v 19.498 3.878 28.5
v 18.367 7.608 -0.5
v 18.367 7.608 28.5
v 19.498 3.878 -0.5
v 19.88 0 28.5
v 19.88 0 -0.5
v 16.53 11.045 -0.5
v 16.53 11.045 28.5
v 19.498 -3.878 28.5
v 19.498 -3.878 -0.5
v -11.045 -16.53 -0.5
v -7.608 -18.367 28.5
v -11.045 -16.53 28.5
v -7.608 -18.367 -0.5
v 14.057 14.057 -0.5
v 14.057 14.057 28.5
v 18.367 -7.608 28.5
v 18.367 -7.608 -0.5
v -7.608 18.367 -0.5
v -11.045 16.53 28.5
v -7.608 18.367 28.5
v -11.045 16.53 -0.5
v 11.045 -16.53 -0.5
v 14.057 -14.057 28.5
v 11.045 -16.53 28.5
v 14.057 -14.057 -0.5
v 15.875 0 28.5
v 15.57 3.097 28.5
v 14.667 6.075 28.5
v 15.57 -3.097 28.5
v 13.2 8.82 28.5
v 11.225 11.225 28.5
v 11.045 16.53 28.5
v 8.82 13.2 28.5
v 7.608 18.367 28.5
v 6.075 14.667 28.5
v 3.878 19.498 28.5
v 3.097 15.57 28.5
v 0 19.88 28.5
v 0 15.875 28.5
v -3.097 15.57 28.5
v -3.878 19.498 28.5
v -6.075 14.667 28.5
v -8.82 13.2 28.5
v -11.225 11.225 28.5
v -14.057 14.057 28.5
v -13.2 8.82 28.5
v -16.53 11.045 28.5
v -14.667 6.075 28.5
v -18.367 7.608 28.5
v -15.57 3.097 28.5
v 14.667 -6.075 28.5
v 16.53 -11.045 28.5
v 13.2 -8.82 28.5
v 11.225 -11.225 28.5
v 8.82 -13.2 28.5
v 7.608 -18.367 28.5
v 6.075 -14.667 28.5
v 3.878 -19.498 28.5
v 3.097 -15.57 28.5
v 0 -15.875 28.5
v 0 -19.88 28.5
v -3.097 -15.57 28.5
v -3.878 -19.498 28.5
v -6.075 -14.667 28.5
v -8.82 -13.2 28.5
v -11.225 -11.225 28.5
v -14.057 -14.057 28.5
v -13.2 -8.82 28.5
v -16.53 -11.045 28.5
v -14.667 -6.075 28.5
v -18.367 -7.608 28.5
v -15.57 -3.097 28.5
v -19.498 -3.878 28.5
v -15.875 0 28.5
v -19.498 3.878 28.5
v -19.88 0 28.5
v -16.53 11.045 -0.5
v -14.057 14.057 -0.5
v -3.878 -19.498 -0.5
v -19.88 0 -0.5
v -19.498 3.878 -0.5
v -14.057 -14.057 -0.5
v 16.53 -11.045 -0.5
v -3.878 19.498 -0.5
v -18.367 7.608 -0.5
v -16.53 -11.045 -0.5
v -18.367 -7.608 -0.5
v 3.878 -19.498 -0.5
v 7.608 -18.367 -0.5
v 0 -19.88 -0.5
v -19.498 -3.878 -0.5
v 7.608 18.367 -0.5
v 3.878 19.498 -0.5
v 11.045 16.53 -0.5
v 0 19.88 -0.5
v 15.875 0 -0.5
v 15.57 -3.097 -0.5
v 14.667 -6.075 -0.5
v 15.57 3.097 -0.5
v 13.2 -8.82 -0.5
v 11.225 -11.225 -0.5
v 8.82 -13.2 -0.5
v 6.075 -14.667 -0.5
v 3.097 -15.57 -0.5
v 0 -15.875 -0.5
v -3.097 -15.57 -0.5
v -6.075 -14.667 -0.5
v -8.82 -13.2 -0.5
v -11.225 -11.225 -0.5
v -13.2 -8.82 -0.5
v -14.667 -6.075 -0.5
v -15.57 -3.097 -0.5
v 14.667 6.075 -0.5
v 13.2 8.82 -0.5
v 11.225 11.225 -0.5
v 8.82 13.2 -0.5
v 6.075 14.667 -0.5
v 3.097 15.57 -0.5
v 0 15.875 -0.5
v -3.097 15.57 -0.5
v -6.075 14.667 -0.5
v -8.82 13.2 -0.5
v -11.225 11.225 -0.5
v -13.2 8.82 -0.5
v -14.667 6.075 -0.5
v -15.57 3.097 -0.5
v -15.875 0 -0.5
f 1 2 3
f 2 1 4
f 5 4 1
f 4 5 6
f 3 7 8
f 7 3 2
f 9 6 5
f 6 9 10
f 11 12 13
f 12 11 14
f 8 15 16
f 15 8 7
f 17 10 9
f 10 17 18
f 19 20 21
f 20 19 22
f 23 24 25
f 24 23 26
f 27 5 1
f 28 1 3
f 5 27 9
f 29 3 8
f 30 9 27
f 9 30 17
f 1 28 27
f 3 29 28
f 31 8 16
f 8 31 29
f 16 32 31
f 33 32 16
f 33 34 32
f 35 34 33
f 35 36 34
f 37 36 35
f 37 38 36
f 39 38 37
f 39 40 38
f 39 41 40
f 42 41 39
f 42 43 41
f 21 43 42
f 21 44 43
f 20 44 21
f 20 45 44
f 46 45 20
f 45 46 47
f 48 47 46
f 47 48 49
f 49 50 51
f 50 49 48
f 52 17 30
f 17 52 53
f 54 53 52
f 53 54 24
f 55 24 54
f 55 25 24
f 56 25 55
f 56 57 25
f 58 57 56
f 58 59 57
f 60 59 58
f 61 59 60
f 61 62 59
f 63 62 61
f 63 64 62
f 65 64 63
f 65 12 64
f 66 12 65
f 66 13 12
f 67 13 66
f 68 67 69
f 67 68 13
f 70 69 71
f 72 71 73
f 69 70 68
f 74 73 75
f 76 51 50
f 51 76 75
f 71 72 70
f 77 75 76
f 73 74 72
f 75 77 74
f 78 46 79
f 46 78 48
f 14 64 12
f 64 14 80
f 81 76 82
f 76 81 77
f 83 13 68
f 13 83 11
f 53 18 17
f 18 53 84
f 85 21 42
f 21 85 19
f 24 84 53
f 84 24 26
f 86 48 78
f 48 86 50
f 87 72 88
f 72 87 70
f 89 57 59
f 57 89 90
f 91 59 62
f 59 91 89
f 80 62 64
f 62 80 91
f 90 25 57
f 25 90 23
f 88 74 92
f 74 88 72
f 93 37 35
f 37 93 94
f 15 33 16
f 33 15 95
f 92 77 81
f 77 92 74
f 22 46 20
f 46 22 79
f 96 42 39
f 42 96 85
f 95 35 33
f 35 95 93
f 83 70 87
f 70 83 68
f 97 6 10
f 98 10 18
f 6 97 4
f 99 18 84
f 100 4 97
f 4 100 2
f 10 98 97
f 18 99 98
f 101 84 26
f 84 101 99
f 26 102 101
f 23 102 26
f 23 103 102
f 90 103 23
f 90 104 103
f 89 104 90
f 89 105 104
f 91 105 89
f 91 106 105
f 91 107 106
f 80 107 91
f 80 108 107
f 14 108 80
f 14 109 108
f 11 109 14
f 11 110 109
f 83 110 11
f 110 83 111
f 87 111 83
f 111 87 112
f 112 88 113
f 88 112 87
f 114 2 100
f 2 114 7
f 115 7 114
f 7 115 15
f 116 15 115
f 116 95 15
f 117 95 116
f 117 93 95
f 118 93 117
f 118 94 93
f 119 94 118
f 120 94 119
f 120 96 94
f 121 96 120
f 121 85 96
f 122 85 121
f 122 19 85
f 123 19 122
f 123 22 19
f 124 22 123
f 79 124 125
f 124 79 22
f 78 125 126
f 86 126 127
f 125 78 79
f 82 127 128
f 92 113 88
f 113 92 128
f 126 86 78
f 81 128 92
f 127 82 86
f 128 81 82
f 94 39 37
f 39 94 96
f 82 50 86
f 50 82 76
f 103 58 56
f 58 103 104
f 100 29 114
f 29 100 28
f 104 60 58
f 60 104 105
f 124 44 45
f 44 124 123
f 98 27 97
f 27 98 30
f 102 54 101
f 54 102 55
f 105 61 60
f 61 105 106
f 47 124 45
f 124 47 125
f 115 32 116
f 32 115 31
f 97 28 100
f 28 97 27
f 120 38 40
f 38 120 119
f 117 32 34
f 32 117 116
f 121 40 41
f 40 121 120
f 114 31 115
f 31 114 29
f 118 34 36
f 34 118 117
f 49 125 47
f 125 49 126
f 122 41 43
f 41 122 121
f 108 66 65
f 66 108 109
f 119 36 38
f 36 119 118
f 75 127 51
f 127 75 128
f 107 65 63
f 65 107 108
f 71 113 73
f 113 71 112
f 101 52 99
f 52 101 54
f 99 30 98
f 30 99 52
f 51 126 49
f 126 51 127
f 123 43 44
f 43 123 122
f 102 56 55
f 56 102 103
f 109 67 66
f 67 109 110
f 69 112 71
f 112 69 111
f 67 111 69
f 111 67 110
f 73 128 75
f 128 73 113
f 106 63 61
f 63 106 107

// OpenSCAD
$fn = 32;

// ----------------------------------------------------------------------
// Two-module gear rim: z12 m2 and z20 m1.4, 28 mm wide
// ----------------------------------------------------------------------

// --- parameters (mm) ---
module_a = 2;             // first tooth module
teeth_a = 12;             // first band tooth count
module_b = 1.4;           // second tooth module
teeth_b = 20;             // second band tooth count
band_h = 12;              // height of one tooth band
web_t = 4;                // web thickness between the bands
total = 28;               // overall width over both bands
root_r = 9.5;             // root radius of the coarse band
hub_r = 19.88;            // hub radius
bore_d = 31.75;           // hub bore
hole_count = 5;           // lightening holes
hole_r = 7.75;            // lightening hole circle radius
hole_d = 4;               // lightening hole diameter

band_a = [[9.4, -1.378], [12.124, -1.51], [13.058, -1.154], [13.986, -0.621], [13.986, 0.621], [13.058, 1.154], [12.124, 1.51], [9.4, 1.378], [8.829, 3.507], [11.254, 4.755], [11.885, 5.53], [12.423, 6.456], [11.802, 7.531], [10.732, 7.528], [9.745, 7.369], [7.451, 5.893], [5.893, 7.451], [7.369, 9.745], [7.528, 10.732], [7.531, 11.802], [6.456, 12.423], [5.53, 11.885], [4.755, 11.254], [3.507, 8.829], [1.378, 9.4], [1.51, 12.124], [1.154, 13.058], [0.621, 13.986], [-0.621, 13.986], [-1.154, 13.058], [-1.51, 12.124], [-1.378, 9.4], [-3.507, 8.829], [-4.755, 11.254], [-5.53, 11.885], [-6.456, 12.423], [-7.531, 11.802], [-7.528, 10.732], [-7.369, 9.745], [-5.893, 7.451], [-7.451, 5.893], [-9.745, 7.369], [-10.732, 7.528], [-11.802, 7.531], [-12.423, 6.456], [-11.885, 5.53], [-11.254, 4.755], [-8.829, 3.507], [-9.4, 1.378], [-12.124, 1.51], [-13.058, 1.154], [-13.986, 0.621], [-13.986, -0.621], [-13.058, -1.154], [-12.124, -1.51], [-9.4, -1.378], [-8.829, -3.507], [-11.254, -4.755], [-11.885, -5.53], [-12.423, -6.456], [-11.802, -7.531], [-10.732, -7.528], [-9.745, -7.369], [-7.451, -5.893], [-5.893, -7.451], [-7.369, -9.745], [-7.528, -10.732], [-7.531, -11.802], [-6.456, -12.423], [-5.53, -11.885], [-4.755, -11.254], [-3.507, -8.829], [-1.378, -9.4], [-1.51, -12.124], [-1.154, -13.058], [-0.621, -13.986], [0.621, -13.986], [1.154, -13.058], [1.51, -12.124], [1.378, -9.4], [3.507, -8.829], [4.755, -11.254], [5.53, -11.885], [6.456, -12.423], [7.531, -11.802], [7.528, -10.732], [7.369, -9.745], [5.893, -7.451], [7.451, -5.893], [9.745, -7.369], [10.732, -7.528], [11.802, -7.531], [12.423, -6.456], [11.885, -5.53], [11.254, -4.755], [8.829, -3.507]];
band_b = [[12.197, -1.14], [13.892, -1.116], [14.644, -0.857], [15.392, -0.486], [15.392, 0.486], [14.644, 0.857], [13.892, 1.116], [12.197, 1.14], [11.952, 2.684], [13.557, 3.232], [14.192, 3.71], [14.789, 4.294], [14.489, 5.219], [13.662, 5.34], [12.868, 5.354], [11.247, 4.854], [10.538, 6.247], [11.895, 7.263], [12.35, 7.914], [12.739, 8.654], [12.167, 9.441], [11.343, 9.3], [10.583, 9.068], [9.197, 8.092], [8.092, 9.197], [9.068, 10.583], [9.3, 11.343], [9.441, 12.167], [8.654, 12.739], [7.914, 12.35], [7.263, 11.895], [6.247, 10.538], [4.854, 11.247], [5.354, 12.868], [5.34, 13.662], [5.219, 14.489], [4.294, 14.789], [3.71, 14.192], [3.232, 13.557], [2.684, 11.952], [1.14, 12.197], [1.116, 13.892], [0.857, 14.644], [0.486, 15.392], [-0.486, 15.392], [-0.857, 14.644], [-1.116, 13.892], [-1.14, 12.197], [-2.684, 11.952], [-3.232, 13.557], [-3.71, 14.192], [-4.294, 14.789], [-5.219, 14.489], [-5.34, 13.662], [-5.354, 12.868], [-4.854, 11.247], [-6.247, 10.538], [-7.263, 11.895], [-7.914, 12.35], [-8.654, 12.739], [-9.441, 12.167], [-9.3, 11.343], [-9.068, 10.583], [-8.092, 9.197], [-9.197, 8.092], [-10.583, 9.068], [-11.343, 9.3], [-12.167, 9.441], [-12.739, 8.654], [-12.35, 7.914], [-11.895, 7.263], [-10.538, 6.247], [-11.247, 4.854], [-12.868, 5.354], [-13.662, 5.34], [-14.489, 5.219], [-14.789, 4.294], [-14.192, 3.71], [-13.557, 3.232], [-11.952, 2.684], [-12.197, 1.14], [-13.892, 1.116], [-14.644, 0.857], [-15.392, 0.486], [-15.392, -0.486], [-14.644, -0.857], [-13.892, -1.116], [-12.197, -1.14], [-11.952, -2.684], [-13.557, -3.232], [-14.192, -3.71], [-14.789, -4.294], [-14.489, -5.219], [-13.662, -5.34], [-12.868, -5.354], [-11.247, -4.854], [-10.538, -6.247], [-11.895, -7.263], [-12.35, -7.914], [-12.739, -8.654], [-12.167, -9.441], [-11.343, -9.3], [-10.583, -9.068], [-9.197, -8.092], [-8.092, -9.197], [-9.068, -10.583], [-9.3, -11.343], [-9.441, -12.167], [-8.654, -12.739], [-7.914, -12.35], [-7.263, -11.895], [-6.247, -10.538], [-4.854, -11.247], [-5.354, -12.868], [-5.34, -13.662], [-5.219, -14.489], [-4.294, -14.789], [-3.71, -14.192], [-3.232, -13.557], [-2.684, -11.952], [-1.14, -12.197], [-1.116, -13.892], [-0.857, -14.644], [-0.486, -15.392], [0.486, -15.392], [0.857, -14.644], [1.116, -13.892], [1.14, -12.197], [2.684, -11.952], [3.232, -13.557], [3.71, -14.192], [4.294, -14.789], [5.219, -14.489], [5.34, -13.662], [5.354, -12.868], [4.854, -11.247], [6.247, -10.538], [7.263, -11.895], [7.914, -12.35], [8.654, -12.739], [9.441, -12.167], [9.3, -11.343], [9.068, -10.583], [8.092, -9.197], [9.197, -8.092], [10.583, -9.068], [11.343, -9.3], [12.167, -9.441], [12.739, -8.654], [12.35, -7.914], [11.895, -7.263], [10.538, -6.247], [11.247, -4.854], [12.868, -5.354], [13.662, -5.34], [14.489, -5.219], [14.789, -4.294], [14.192, -3.71], [13.557, -3.232], [11.952, -2.684]];

difference() {
  union() {
    /* tooth band A, overlapping the web by 0.4 mm */
    linear_extrude(height = band_h + 0.4) polygon(band_a);
    /* web */
    translate([0, 0, band_h - 0.4]) cylinder(h = web_t + 0.8, d = 2 * root_r);
    /* tooth band B */
    translate([0, 0, band_h + web_t]) linear_extrude(height = band_h + 0.4) polygon(band_b);
    /* hub */
    translate([0, 0, -0.5]) cylinder(h = total + 1.0, d = 2 * hub_r);
  }
  /* bore */
  translate([0, 0, -2.5]) cylinder(h = total + 5, d = bore_d);
  /* lightening holes through the web */
  for (i = [0 : hole_count - 1]) {
    a = i * 360 / hole_count;
    translate([hole_r * cos(a), hole_r * sin(a), -2.5]) cylinder(h = total + 5, d = hole_d);
  }
}
